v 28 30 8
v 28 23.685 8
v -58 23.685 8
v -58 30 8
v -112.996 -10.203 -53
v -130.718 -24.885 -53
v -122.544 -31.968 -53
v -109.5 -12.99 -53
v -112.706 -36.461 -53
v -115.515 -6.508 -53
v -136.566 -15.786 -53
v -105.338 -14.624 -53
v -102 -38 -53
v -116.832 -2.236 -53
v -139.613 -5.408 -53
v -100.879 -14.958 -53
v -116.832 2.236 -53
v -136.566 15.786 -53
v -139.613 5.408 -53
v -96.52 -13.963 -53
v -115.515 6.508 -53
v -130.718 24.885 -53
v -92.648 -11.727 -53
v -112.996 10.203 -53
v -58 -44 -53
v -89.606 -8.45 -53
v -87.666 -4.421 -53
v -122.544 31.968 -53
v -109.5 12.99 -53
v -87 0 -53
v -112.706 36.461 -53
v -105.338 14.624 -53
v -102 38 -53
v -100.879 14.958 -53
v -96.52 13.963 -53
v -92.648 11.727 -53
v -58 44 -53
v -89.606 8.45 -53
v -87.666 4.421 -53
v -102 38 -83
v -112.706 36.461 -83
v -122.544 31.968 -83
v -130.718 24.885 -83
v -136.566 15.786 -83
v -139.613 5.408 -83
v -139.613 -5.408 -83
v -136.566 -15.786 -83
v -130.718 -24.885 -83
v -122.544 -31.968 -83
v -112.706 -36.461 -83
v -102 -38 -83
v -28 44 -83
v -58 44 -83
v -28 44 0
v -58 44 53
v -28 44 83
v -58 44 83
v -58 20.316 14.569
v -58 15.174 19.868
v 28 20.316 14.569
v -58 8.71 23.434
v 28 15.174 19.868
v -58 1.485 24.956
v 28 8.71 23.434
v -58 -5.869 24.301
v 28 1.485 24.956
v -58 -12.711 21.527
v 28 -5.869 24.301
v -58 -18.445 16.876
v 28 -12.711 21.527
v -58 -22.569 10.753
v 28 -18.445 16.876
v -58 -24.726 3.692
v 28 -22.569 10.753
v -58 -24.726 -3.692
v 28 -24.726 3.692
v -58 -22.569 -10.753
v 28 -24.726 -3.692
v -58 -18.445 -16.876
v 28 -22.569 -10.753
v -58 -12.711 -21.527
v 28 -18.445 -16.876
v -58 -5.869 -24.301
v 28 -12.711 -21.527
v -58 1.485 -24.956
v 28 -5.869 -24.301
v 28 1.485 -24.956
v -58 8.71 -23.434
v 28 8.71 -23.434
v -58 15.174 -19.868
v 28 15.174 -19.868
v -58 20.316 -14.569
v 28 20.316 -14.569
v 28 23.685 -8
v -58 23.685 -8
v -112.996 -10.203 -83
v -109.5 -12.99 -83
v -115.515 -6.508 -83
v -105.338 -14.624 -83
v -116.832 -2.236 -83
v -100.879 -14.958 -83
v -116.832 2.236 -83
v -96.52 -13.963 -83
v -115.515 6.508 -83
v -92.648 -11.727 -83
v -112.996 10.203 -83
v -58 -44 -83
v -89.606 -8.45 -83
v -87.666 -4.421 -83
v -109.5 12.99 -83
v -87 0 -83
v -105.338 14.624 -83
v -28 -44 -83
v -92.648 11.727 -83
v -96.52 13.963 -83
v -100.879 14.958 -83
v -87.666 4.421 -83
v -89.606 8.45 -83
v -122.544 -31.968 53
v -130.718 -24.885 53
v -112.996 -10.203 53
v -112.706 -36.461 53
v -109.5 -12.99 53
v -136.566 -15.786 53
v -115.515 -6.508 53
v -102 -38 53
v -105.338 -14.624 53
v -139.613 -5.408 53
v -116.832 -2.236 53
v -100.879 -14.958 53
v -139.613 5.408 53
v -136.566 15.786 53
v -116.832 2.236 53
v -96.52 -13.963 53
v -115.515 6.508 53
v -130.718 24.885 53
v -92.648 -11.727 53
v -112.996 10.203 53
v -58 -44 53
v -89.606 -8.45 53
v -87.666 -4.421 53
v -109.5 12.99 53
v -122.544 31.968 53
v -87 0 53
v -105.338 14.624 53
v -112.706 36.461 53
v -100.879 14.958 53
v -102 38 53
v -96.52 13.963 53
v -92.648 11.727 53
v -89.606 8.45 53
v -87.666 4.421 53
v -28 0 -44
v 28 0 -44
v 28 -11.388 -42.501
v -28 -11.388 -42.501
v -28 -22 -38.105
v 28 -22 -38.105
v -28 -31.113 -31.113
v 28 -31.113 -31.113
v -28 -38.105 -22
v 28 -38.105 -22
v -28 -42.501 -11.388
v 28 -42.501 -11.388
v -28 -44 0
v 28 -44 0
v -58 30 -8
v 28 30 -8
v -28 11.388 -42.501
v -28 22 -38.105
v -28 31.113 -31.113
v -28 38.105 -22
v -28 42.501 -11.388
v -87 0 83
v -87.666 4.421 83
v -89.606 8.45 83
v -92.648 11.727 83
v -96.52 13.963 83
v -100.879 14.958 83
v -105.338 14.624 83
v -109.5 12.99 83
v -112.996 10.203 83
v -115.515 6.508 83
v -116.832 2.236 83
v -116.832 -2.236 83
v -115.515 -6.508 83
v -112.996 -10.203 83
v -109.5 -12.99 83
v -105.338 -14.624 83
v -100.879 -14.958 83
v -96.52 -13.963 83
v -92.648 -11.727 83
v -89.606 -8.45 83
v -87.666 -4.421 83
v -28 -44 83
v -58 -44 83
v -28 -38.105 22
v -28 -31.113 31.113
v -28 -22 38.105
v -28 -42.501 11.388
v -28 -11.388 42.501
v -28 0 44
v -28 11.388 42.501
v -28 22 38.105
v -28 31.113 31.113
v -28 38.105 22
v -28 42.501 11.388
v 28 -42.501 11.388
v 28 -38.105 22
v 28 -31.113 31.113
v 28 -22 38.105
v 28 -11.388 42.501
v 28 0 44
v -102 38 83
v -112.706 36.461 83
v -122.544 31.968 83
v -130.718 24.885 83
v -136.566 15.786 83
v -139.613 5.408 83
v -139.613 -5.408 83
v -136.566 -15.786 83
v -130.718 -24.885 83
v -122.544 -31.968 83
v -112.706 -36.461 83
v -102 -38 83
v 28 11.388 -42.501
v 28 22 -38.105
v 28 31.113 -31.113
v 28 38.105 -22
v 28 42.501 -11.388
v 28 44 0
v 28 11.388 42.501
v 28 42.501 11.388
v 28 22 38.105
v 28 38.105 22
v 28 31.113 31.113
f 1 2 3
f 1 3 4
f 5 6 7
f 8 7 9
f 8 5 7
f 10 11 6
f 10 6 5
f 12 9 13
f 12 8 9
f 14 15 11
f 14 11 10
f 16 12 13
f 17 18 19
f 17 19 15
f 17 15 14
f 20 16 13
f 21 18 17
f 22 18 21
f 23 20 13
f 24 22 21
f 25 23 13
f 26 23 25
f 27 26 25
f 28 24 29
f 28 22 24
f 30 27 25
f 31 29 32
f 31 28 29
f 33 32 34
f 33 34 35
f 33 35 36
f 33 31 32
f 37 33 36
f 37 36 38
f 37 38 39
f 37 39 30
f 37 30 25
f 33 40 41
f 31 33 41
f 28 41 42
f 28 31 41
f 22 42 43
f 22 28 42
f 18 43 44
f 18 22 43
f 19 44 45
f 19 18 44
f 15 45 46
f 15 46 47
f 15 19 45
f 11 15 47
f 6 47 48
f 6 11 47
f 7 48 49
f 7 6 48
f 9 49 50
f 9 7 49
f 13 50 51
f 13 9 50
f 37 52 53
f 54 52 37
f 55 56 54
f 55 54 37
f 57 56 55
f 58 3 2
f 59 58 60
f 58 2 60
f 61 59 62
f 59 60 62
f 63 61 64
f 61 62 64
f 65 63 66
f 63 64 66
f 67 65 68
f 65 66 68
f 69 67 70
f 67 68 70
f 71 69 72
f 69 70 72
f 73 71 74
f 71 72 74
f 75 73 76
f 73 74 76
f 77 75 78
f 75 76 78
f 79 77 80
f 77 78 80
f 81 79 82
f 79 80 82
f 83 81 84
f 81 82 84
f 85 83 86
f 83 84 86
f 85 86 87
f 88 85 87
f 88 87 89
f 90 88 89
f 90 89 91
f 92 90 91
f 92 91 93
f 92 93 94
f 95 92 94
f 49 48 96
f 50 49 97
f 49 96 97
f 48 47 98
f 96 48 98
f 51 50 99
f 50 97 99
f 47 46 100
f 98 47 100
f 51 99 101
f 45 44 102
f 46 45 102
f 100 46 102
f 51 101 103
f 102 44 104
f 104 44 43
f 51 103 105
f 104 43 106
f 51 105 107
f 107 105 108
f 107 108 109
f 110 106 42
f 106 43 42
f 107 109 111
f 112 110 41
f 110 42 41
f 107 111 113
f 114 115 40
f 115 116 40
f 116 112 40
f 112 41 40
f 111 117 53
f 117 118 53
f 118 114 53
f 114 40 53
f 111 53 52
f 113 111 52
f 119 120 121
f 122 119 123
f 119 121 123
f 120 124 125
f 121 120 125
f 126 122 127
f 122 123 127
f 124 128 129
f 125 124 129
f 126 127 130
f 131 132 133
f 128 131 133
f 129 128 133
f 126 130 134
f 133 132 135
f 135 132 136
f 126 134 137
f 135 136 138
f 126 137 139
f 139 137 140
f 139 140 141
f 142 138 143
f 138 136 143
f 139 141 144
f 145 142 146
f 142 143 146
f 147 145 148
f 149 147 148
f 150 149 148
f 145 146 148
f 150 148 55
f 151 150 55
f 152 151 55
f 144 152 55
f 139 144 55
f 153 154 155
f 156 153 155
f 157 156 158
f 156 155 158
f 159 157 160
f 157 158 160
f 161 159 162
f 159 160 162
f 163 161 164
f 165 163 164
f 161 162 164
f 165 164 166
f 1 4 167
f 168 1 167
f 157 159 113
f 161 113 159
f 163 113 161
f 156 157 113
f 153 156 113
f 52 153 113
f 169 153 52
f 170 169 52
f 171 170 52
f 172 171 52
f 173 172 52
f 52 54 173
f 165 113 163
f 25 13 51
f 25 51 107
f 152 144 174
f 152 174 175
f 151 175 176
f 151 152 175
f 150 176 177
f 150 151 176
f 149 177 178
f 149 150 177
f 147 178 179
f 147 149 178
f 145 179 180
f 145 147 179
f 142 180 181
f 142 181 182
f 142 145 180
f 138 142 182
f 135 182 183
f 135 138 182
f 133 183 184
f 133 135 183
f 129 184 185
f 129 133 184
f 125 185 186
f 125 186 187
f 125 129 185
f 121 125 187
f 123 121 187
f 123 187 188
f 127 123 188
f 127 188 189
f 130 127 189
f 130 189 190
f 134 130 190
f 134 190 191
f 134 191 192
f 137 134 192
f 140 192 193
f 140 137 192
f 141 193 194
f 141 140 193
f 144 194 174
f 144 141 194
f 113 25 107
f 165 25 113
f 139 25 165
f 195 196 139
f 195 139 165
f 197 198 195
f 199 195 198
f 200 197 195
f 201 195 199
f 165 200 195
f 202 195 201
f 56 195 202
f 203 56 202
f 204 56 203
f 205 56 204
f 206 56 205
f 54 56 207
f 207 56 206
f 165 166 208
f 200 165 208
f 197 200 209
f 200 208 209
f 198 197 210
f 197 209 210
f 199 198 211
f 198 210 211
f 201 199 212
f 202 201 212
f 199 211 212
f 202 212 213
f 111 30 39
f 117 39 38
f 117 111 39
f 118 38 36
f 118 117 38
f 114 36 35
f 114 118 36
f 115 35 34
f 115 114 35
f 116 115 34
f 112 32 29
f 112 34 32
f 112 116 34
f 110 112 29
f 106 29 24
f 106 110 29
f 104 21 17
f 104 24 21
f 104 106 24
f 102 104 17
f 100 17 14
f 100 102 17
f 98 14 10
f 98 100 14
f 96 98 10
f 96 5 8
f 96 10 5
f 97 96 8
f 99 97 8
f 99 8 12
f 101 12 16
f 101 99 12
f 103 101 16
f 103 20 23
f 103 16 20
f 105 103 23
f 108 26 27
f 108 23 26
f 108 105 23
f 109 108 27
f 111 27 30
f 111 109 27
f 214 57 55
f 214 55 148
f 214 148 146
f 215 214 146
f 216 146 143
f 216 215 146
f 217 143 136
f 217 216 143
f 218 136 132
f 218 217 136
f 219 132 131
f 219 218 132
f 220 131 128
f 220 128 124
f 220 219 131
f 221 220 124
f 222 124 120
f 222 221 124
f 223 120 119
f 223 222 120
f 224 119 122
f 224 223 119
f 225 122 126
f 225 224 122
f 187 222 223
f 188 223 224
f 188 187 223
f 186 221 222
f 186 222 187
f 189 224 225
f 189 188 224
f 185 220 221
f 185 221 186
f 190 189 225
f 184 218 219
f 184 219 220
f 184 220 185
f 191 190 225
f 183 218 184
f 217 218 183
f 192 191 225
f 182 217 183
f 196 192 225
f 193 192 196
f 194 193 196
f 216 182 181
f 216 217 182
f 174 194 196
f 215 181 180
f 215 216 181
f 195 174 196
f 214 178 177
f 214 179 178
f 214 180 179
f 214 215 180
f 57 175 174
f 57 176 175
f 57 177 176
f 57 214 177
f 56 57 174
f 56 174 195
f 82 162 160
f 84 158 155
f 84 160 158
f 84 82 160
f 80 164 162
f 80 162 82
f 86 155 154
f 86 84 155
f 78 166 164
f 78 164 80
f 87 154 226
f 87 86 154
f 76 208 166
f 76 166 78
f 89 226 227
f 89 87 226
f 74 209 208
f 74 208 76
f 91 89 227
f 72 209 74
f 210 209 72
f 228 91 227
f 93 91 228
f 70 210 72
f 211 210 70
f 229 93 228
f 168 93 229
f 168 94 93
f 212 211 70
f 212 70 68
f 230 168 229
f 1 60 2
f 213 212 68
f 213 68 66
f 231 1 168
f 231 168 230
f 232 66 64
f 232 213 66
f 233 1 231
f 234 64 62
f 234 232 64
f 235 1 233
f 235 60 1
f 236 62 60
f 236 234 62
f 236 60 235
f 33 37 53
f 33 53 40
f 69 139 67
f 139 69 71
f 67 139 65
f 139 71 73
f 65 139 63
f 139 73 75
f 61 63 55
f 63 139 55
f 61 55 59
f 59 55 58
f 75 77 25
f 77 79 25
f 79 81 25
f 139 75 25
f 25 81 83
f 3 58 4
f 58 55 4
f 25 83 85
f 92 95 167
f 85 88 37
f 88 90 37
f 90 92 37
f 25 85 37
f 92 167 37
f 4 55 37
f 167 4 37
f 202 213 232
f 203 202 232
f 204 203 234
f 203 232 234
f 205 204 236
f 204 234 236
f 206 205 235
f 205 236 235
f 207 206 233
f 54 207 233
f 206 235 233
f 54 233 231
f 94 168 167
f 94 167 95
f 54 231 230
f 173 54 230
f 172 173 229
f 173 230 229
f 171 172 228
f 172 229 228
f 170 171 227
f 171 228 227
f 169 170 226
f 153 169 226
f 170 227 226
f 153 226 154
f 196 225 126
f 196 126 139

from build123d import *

# Parameters (mm, degrees)
SKETCH1_W           = 56
SKETCH1_H           = 88
BOSS_EXTRUDE1_DEPTH = 44
SKETCH1_3_R         = 15
BOSS_EXTRUDE2_DEPTH = 83
SKETCH2_W           = 82
SKETCH2_H           = 106
CUT_EXTRUDE1_DEPTH  = 83
CUT_EXTRUDE2_DEPTH  = 56
SKETCH3_4_R         = 25
CUT_EXTRUDE3_DEPTH  = 196
CUT_EXTRUDE6_DEPTH  = 246


with BuildPart() as part:
    # Sketch1 → Boss-Extrude1 (new, symmetric)
    with BuildSketch(Plane.XY):
        Rectangle(SKETCH1_W, SKETCH1_H)
    extrude(amount=BOSS_EXTRUDE1_DEPTH, both=True)

    # Sketch1<3> → Boss-Extrude2 (add, symmetric)
    with BuildSketch(Plane.XY):
        with BuildLine():
            Line((-28, -44), (-28, 44))
            Line((-28, 44), (-58, 44))
            Line((-58, 44), (-102, 38))
            ThreePointArc((-102, 38), (-140, 0), (-102, -38))
            Line((-102, -38), (-58, -44))
            Line((-58, -44), (-28, -44))
        make_face()
        with Locations((-102, 0)):
            Circle(SKETCH1_3_R, mode=Mode.SUBTRACT)
    extrude(amount=BOSS_EXTRUDE2_DEPTH, both=True)

    # Sketch2 → Cut-Extrude1 (cut, symmetric)
    with BuildSketch(Plane(origin=(0, 0, 0), x_dir=(1, 0, 0), z_dir=(0, 1, 0))):
        with Locations((-99, 0)):
            Rectangle(SKETCH2_W, SKETCH2_H)
    extrude(amount=CUT_EXTRUDE1_DEPTH, both=True, mode=Mode.SUBTRACT)

    # Sketch3 → Cut-Extrude2 (cut)
    with BuildSketch(Plane(origin=(28, 0, 0), x_dir=(0, 0, -1), z_dir=(1, 0, 0))):
        with BuildLine():
            Line((-44, 44), (-44, 0))
            ThreePointArc((-44, 0), (-31.112698372, 31.112698372), (0, 44))
            Line((0, 44), (-44, 44))
        make_face()
        with BuildLine():
            ThreePointArc((0, -44), (-31.112698372, -31.112698372), (-44, 0))
            Line((-44, 0), (-44, -44))
            Line((-44, -44), (0, -44))
        make_face()
        with BuildLine():
            Line((44, 44), (0, 44))
            ThreePointArc((0, 44), (31.112698372, 31.112698372), (44, 0))
            Line((44, 0), (44, 44))
        make_face()
        with BuildLine():
            ThreePointArc((44, 0), (31.112698372, -31.112698372), (0, -44))
            Line((0, -44), (44, -44))
            Line((44, -44), (44, 0))
        make_face()
    extrude(amount=-CUT_EXTRUDE2_DEPTH, mode=Mode.SUBTRACT)

    # Sketch3<4> → Cut-Extrude3 (cut)
    with BuildSketch(Plane(origin=(28, 0, 0), x_dir=(0, 0, -1), z_dir=(1, 0, 0))):
        Circle(SKETCH3_4_R)
    extrude(amount=-CUT_EXTRUDE3_DEPTH, mode=Mode.SUBTRACT)

    # Sketch5 → Cut-Extrude6 (cut)
    with BuildSketch(Plane(origin=(28, 0, 0), x_dir=(0, 0, -1), z_dir=(1, 0, 0))):
        with BuildLine():
            Line((8, 30), (-8, 30))
            Line((-8, 30), (-8, 23.685438565))
            ThreePointArc((-8, 23.685438565), (-6.020486484, 24.264248237), (-4, 24.677925359))
            ThreePointArc((-4, 24.677925359), (0, 25), (4, 24.677925359))
            ThreePointArc((4, 24.677925359), (6.020486484, 24.264248237), (8, 23.685438565))
            Line((8, 23.685438565), (8, 30))
        make_face()
    extrude(amount=-CUT_EXTRUDE6_DEPTH, mode=Mode.SUBTRACT)


solid = part.part
